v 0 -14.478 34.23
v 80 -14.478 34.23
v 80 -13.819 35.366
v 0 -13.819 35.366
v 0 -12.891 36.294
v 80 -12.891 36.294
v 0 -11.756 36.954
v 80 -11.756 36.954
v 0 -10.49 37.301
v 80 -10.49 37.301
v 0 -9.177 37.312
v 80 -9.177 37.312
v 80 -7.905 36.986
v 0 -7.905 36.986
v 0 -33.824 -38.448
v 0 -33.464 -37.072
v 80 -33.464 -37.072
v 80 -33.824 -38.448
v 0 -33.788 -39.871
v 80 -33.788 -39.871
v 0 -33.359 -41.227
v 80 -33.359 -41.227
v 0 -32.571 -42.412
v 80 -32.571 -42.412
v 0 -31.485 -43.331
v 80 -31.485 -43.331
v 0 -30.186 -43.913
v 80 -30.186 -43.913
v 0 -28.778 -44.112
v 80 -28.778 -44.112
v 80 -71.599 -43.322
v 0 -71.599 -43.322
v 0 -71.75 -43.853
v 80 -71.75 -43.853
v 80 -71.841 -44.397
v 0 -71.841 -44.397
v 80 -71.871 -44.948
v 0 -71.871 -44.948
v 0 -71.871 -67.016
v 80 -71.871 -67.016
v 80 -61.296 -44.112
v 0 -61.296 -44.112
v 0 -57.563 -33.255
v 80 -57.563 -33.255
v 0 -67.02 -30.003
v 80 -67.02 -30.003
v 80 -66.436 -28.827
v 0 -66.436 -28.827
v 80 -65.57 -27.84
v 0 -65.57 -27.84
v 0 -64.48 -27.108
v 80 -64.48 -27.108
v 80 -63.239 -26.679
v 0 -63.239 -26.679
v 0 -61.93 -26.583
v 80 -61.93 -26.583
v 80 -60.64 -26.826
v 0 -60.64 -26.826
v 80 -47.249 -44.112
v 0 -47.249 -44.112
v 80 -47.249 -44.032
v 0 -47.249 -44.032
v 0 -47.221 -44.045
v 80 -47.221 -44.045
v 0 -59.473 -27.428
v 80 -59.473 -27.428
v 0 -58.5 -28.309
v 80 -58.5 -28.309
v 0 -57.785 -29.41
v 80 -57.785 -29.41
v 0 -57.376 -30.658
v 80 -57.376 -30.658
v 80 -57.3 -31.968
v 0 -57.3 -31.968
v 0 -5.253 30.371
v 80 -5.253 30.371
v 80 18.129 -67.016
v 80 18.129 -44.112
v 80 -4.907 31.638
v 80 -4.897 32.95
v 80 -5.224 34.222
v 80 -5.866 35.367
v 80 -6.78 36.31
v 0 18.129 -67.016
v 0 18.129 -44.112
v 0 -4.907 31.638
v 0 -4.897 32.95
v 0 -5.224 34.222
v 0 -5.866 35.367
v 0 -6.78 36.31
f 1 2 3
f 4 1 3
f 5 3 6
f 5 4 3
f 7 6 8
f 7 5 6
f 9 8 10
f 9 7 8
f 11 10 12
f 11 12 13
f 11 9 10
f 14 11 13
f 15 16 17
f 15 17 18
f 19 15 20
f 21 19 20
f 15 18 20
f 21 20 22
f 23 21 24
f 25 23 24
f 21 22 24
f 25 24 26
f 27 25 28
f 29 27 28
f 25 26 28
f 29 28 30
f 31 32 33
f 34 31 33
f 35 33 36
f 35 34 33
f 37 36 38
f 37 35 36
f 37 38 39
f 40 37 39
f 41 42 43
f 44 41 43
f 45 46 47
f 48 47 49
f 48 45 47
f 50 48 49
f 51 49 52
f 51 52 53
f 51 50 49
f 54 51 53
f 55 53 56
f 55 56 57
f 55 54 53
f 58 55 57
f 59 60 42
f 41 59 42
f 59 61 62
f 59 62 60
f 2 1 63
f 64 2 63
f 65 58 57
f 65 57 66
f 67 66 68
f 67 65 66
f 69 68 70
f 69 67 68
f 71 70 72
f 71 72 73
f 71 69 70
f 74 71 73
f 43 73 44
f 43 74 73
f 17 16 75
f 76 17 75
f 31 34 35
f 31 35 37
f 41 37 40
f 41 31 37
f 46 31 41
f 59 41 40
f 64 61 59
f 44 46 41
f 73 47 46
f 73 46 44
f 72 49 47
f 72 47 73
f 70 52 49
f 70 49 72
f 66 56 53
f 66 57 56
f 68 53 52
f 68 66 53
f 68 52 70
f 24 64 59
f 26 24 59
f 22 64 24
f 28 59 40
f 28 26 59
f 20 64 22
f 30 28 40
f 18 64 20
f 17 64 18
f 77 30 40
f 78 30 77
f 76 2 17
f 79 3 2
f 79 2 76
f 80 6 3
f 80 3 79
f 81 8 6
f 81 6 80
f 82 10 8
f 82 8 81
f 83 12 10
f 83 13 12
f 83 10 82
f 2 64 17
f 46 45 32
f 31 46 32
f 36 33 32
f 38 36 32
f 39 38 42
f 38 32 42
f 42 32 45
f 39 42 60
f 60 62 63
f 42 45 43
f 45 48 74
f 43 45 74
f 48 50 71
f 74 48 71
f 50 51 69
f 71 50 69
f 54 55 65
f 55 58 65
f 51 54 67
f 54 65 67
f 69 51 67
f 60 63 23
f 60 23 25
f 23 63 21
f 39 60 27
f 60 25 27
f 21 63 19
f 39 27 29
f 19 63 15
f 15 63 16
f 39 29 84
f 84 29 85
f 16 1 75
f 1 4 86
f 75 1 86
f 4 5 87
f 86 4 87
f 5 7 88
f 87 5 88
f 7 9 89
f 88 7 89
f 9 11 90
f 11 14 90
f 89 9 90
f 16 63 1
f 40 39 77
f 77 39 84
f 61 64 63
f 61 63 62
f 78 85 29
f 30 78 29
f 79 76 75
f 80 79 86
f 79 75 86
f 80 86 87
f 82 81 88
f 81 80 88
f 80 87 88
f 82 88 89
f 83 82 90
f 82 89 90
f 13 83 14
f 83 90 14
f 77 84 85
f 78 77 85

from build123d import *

# Parameters (mm, degrees)
F1_DEPTH    = 80
F2_R        = 5
F3_T1_DEPTH = 105.4
F4_T1_DEPTH = 105.4
F5_R        = 5.08


# Not quite as in the source:
# - a fillet or chamfer that OpenCascade refuses, or shapes differently, is made with other operations: its cross-section is extruded or revolved along the edge and cut away or added


with BuildPart() as f1:
    # F0 (on Right) → F1 (new body)
    with BuildSketch(Plane.YZ):
        Polygon((-65.3676100316, -25.1990987622), (-71.8711540103, -44.1121608019), (-61.2964517447, -44.1121608019), (-55.9110790118, -28.4508707515), align=None)
        Polygon((-61.2964517447, -44.1121608019), (-71.8711540103, -44.1121608019), (-71.8711540103, -67.0164749026), (18.1288459897, -67.0164749026), (18.1288459897, -44.1121608019), (-36.4091803752, -44.1121608019), (-47.0806523531, -44.1121608019), (-47.2488089486, -44.1121608019), align=None)
        Polygon((-47.220791987, -44.0451827606), (-47.2488089486, -44.1121608019), (-47.0806523531, -44.1121608019), align=None)
        Polygon((-47.2488089486, -44.031792393), (-47.2488089486, -44.1121608019), (-47.220791987, -44.0451827606), align=None)
        Polygon((-47.220791987, -44.0451827606), (-47.0806523531, -44.1121608019), (-36.4091803752, -44.1121608019), (-3.2924475957, 35.0575196106), (-12.5178559501, 38.9165143882), align=None)
    extrude(amount=F1_DEPTH)

    # F2
    f2_edges = [f1.edges().sort_by_distance(p)[0] for p in [
        (40, -71.871154, -44.112161),
    ]]
    fillet(f2_edges, radius=F2_R)

    # F3: fillet of radius 5.08 on 2 edges, made by hand

    # F3_s2 → F3_t1 (cut)
    with BuildSketch(Plane.YZ.offset(-12.7)):
        with BuildLine():
            ThreePointArc((-5.2528169427, 30.3710121665), (-5.2392727341, 34.2590522484), (-7.9789550397, 37.0178889576))
            Line((-7.9789550397, 37.0178889576), (-3.2924475957, 35.0575196106))
            Line((-3.2924475957, 35.0575196106), (-5.2528169427, 30.3710121665))
        make_face()
        with BuildLine():
            ThreePointArc((-14.4782252971, 34.2300069441), (-11.719388588, 36.9696892498), (-7.8313485061, 36.9561450412))
            Line((-7.8313485061, 36.9561450412), (-12.5178559501, 38.9165143882))
            Line((-12.5178559501, 38.9165143882), (-14.4782252971, 34.2300069441))
        make_face()
    extrude(amount=F3_T1_DEPTH, mode=Mode.SUBTRACT)

    # F4: fillet of radius 5.08 on 2 edges, made by hand

    # F4_s2 → F4_t1 (cut)
    with BuildSketch(Plane.YZ.offset(-12.7)):
        with BuildLine():
            ThreePointArc((-60.7149967698, -26.798970581), (-57.801944305, -29.3740753285), (-57.5629791823, -33.2547885096))
            Line((-57.5629791823, -33.2547885096), (-55.9110790118, -28.4508707515))
            Line((-55.9110790118, -28.4508707515), (-60.7149967698, -26.798970581))
        make_face()
        with BuildLine():
            ThreePointArc((-67.0195102022, -30.0030165203), (-64.4444054547, -27.0899640554), (-60.5636922735, -26.8509989328))
            Line((-60.5636922735, -26.8509989328), (-65.3676100316, -25.1990987622))
            Line((-65.3676100316, -25.1990987622), (-67.0195102022, -30.0030165203))
        make_face()
    extrude(amount=F4_T1_DEPTH, mode=Mode.SUBTRACT)

    # F5
    f5_edges = [f1.edges().sort_by_distance(p)[0] for p in [
        (40, -36.40918, -44.112161),
    ]]
    fillet(f5_edges, radius=F5_R)


solid = f1.part
